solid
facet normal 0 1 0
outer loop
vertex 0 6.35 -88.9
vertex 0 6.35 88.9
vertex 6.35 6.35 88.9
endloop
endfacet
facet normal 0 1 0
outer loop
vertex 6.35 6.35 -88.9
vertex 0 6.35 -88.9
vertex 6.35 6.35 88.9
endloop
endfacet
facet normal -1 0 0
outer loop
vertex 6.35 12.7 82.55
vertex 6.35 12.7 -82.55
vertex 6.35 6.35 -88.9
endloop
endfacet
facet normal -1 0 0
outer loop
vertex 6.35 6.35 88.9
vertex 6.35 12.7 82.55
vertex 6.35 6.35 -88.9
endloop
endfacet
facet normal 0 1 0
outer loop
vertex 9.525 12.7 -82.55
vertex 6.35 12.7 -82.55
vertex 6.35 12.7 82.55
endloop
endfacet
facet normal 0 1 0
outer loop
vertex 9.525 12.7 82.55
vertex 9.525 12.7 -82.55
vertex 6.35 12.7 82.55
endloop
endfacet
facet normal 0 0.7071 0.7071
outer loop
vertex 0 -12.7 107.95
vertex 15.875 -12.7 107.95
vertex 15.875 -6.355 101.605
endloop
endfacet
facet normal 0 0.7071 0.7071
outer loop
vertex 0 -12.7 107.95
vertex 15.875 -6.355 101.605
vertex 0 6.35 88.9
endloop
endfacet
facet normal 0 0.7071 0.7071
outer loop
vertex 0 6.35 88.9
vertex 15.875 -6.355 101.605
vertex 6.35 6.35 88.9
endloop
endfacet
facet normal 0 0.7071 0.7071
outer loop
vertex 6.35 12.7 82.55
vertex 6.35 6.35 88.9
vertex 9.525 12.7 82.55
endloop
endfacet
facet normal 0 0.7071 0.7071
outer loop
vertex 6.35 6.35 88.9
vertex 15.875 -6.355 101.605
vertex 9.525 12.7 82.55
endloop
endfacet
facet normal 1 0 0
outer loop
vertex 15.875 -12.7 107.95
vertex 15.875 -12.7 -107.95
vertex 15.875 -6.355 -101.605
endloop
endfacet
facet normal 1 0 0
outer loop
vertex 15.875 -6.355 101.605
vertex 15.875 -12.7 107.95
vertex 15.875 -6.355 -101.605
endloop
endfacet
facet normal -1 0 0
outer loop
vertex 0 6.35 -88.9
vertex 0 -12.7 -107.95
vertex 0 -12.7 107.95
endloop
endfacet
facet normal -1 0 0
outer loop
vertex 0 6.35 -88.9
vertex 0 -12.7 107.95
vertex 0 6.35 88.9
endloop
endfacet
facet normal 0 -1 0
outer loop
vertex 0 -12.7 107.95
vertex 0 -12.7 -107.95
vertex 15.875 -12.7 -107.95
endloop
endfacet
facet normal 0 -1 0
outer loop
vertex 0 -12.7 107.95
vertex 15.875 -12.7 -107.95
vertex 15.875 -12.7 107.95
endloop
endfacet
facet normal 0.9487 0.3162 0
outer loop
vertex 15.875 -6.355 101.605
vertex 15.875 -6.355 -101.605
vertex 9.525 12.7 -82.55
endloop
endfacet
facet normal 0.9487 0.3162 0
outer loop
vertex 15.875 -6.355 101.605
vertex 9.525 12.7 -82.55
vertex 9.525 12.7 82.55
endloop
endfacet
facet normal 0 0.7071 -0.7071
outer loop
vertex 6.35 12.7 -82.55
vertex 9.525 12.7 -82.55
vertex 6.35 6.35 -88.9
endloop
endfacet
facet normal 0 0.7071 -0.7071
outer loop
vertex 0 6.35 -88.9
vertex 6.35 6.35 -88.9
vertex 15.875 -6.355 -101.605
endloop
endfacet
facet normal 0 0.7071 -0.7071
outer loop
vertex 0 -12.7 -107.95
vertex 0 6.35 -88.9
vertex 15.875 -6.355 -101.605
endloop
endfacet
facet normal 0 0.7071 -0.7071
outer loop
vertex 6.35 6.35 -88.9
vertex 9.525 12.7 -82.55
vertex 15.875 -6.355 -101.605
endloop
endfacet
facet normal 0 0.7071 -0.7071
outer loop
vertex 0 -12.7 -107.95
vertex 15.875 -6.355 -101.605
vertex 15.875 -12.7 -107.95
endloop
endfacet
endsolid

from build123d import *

# Parameters (mm, degrees)
F0_W     = 25.4
F0_H     = 215.9
F1_DEPTH = 15.875
F3_W     = 6.35
F3_H     = 6.35
F4_DEPTH = 215.901
F5_DEPTH = 15.876
F6_SIZE2 = 19.0554861232
F6_SIZE  = 6.35


with BuildPart() as f1:
    # F0 (on Right) → F1 (new body)
    with BuildSketch(Plane.YZ):
        Rectangle(F0_W, F0_H)
    extrude(amount=F1_DEPTH)

    # F3 (on face) → F4 (cut, through all)
    with BuildSketch(Plane(origin=(0, 0, -107.95), x_dir=(1, 0, 0), z_dir=(0, 0, -1))):
        with Locations((3.175, -9.525)):
            Rectangle(F3_W, F3_H)
    extrude(amount=-F4_DEPTH, mode=Mode.SUBTRACT)

    # F2 (on face) → F5 (cut, through all)
    with BuildSketch(Plane.YZ.offset(15.875)):
        Polygon((12.7, 107.95), (-12.7, 107.95), (12.7, 82.55), align=None)
        Polygon((12.7, -82.55), (-12.7, -107.95), (12.7, -107.95), align=None)
    extrude(amount=-F5_DEPTH, mode=Mode.SUBTRACT)

    # F6
    f6_edges = [f1.edges().sort_by_distance(p)[0] for p in [
        (15.875, 12.7, 0),
    ]]
    f6_side = f1.faces().sort_by_distance((11.1125, 12.7, 0))[0]
    chamfer(f6_edges, length=F6_SIZE, length2=F6_SIZE2, reference=f6_side)


solid = f1.part
